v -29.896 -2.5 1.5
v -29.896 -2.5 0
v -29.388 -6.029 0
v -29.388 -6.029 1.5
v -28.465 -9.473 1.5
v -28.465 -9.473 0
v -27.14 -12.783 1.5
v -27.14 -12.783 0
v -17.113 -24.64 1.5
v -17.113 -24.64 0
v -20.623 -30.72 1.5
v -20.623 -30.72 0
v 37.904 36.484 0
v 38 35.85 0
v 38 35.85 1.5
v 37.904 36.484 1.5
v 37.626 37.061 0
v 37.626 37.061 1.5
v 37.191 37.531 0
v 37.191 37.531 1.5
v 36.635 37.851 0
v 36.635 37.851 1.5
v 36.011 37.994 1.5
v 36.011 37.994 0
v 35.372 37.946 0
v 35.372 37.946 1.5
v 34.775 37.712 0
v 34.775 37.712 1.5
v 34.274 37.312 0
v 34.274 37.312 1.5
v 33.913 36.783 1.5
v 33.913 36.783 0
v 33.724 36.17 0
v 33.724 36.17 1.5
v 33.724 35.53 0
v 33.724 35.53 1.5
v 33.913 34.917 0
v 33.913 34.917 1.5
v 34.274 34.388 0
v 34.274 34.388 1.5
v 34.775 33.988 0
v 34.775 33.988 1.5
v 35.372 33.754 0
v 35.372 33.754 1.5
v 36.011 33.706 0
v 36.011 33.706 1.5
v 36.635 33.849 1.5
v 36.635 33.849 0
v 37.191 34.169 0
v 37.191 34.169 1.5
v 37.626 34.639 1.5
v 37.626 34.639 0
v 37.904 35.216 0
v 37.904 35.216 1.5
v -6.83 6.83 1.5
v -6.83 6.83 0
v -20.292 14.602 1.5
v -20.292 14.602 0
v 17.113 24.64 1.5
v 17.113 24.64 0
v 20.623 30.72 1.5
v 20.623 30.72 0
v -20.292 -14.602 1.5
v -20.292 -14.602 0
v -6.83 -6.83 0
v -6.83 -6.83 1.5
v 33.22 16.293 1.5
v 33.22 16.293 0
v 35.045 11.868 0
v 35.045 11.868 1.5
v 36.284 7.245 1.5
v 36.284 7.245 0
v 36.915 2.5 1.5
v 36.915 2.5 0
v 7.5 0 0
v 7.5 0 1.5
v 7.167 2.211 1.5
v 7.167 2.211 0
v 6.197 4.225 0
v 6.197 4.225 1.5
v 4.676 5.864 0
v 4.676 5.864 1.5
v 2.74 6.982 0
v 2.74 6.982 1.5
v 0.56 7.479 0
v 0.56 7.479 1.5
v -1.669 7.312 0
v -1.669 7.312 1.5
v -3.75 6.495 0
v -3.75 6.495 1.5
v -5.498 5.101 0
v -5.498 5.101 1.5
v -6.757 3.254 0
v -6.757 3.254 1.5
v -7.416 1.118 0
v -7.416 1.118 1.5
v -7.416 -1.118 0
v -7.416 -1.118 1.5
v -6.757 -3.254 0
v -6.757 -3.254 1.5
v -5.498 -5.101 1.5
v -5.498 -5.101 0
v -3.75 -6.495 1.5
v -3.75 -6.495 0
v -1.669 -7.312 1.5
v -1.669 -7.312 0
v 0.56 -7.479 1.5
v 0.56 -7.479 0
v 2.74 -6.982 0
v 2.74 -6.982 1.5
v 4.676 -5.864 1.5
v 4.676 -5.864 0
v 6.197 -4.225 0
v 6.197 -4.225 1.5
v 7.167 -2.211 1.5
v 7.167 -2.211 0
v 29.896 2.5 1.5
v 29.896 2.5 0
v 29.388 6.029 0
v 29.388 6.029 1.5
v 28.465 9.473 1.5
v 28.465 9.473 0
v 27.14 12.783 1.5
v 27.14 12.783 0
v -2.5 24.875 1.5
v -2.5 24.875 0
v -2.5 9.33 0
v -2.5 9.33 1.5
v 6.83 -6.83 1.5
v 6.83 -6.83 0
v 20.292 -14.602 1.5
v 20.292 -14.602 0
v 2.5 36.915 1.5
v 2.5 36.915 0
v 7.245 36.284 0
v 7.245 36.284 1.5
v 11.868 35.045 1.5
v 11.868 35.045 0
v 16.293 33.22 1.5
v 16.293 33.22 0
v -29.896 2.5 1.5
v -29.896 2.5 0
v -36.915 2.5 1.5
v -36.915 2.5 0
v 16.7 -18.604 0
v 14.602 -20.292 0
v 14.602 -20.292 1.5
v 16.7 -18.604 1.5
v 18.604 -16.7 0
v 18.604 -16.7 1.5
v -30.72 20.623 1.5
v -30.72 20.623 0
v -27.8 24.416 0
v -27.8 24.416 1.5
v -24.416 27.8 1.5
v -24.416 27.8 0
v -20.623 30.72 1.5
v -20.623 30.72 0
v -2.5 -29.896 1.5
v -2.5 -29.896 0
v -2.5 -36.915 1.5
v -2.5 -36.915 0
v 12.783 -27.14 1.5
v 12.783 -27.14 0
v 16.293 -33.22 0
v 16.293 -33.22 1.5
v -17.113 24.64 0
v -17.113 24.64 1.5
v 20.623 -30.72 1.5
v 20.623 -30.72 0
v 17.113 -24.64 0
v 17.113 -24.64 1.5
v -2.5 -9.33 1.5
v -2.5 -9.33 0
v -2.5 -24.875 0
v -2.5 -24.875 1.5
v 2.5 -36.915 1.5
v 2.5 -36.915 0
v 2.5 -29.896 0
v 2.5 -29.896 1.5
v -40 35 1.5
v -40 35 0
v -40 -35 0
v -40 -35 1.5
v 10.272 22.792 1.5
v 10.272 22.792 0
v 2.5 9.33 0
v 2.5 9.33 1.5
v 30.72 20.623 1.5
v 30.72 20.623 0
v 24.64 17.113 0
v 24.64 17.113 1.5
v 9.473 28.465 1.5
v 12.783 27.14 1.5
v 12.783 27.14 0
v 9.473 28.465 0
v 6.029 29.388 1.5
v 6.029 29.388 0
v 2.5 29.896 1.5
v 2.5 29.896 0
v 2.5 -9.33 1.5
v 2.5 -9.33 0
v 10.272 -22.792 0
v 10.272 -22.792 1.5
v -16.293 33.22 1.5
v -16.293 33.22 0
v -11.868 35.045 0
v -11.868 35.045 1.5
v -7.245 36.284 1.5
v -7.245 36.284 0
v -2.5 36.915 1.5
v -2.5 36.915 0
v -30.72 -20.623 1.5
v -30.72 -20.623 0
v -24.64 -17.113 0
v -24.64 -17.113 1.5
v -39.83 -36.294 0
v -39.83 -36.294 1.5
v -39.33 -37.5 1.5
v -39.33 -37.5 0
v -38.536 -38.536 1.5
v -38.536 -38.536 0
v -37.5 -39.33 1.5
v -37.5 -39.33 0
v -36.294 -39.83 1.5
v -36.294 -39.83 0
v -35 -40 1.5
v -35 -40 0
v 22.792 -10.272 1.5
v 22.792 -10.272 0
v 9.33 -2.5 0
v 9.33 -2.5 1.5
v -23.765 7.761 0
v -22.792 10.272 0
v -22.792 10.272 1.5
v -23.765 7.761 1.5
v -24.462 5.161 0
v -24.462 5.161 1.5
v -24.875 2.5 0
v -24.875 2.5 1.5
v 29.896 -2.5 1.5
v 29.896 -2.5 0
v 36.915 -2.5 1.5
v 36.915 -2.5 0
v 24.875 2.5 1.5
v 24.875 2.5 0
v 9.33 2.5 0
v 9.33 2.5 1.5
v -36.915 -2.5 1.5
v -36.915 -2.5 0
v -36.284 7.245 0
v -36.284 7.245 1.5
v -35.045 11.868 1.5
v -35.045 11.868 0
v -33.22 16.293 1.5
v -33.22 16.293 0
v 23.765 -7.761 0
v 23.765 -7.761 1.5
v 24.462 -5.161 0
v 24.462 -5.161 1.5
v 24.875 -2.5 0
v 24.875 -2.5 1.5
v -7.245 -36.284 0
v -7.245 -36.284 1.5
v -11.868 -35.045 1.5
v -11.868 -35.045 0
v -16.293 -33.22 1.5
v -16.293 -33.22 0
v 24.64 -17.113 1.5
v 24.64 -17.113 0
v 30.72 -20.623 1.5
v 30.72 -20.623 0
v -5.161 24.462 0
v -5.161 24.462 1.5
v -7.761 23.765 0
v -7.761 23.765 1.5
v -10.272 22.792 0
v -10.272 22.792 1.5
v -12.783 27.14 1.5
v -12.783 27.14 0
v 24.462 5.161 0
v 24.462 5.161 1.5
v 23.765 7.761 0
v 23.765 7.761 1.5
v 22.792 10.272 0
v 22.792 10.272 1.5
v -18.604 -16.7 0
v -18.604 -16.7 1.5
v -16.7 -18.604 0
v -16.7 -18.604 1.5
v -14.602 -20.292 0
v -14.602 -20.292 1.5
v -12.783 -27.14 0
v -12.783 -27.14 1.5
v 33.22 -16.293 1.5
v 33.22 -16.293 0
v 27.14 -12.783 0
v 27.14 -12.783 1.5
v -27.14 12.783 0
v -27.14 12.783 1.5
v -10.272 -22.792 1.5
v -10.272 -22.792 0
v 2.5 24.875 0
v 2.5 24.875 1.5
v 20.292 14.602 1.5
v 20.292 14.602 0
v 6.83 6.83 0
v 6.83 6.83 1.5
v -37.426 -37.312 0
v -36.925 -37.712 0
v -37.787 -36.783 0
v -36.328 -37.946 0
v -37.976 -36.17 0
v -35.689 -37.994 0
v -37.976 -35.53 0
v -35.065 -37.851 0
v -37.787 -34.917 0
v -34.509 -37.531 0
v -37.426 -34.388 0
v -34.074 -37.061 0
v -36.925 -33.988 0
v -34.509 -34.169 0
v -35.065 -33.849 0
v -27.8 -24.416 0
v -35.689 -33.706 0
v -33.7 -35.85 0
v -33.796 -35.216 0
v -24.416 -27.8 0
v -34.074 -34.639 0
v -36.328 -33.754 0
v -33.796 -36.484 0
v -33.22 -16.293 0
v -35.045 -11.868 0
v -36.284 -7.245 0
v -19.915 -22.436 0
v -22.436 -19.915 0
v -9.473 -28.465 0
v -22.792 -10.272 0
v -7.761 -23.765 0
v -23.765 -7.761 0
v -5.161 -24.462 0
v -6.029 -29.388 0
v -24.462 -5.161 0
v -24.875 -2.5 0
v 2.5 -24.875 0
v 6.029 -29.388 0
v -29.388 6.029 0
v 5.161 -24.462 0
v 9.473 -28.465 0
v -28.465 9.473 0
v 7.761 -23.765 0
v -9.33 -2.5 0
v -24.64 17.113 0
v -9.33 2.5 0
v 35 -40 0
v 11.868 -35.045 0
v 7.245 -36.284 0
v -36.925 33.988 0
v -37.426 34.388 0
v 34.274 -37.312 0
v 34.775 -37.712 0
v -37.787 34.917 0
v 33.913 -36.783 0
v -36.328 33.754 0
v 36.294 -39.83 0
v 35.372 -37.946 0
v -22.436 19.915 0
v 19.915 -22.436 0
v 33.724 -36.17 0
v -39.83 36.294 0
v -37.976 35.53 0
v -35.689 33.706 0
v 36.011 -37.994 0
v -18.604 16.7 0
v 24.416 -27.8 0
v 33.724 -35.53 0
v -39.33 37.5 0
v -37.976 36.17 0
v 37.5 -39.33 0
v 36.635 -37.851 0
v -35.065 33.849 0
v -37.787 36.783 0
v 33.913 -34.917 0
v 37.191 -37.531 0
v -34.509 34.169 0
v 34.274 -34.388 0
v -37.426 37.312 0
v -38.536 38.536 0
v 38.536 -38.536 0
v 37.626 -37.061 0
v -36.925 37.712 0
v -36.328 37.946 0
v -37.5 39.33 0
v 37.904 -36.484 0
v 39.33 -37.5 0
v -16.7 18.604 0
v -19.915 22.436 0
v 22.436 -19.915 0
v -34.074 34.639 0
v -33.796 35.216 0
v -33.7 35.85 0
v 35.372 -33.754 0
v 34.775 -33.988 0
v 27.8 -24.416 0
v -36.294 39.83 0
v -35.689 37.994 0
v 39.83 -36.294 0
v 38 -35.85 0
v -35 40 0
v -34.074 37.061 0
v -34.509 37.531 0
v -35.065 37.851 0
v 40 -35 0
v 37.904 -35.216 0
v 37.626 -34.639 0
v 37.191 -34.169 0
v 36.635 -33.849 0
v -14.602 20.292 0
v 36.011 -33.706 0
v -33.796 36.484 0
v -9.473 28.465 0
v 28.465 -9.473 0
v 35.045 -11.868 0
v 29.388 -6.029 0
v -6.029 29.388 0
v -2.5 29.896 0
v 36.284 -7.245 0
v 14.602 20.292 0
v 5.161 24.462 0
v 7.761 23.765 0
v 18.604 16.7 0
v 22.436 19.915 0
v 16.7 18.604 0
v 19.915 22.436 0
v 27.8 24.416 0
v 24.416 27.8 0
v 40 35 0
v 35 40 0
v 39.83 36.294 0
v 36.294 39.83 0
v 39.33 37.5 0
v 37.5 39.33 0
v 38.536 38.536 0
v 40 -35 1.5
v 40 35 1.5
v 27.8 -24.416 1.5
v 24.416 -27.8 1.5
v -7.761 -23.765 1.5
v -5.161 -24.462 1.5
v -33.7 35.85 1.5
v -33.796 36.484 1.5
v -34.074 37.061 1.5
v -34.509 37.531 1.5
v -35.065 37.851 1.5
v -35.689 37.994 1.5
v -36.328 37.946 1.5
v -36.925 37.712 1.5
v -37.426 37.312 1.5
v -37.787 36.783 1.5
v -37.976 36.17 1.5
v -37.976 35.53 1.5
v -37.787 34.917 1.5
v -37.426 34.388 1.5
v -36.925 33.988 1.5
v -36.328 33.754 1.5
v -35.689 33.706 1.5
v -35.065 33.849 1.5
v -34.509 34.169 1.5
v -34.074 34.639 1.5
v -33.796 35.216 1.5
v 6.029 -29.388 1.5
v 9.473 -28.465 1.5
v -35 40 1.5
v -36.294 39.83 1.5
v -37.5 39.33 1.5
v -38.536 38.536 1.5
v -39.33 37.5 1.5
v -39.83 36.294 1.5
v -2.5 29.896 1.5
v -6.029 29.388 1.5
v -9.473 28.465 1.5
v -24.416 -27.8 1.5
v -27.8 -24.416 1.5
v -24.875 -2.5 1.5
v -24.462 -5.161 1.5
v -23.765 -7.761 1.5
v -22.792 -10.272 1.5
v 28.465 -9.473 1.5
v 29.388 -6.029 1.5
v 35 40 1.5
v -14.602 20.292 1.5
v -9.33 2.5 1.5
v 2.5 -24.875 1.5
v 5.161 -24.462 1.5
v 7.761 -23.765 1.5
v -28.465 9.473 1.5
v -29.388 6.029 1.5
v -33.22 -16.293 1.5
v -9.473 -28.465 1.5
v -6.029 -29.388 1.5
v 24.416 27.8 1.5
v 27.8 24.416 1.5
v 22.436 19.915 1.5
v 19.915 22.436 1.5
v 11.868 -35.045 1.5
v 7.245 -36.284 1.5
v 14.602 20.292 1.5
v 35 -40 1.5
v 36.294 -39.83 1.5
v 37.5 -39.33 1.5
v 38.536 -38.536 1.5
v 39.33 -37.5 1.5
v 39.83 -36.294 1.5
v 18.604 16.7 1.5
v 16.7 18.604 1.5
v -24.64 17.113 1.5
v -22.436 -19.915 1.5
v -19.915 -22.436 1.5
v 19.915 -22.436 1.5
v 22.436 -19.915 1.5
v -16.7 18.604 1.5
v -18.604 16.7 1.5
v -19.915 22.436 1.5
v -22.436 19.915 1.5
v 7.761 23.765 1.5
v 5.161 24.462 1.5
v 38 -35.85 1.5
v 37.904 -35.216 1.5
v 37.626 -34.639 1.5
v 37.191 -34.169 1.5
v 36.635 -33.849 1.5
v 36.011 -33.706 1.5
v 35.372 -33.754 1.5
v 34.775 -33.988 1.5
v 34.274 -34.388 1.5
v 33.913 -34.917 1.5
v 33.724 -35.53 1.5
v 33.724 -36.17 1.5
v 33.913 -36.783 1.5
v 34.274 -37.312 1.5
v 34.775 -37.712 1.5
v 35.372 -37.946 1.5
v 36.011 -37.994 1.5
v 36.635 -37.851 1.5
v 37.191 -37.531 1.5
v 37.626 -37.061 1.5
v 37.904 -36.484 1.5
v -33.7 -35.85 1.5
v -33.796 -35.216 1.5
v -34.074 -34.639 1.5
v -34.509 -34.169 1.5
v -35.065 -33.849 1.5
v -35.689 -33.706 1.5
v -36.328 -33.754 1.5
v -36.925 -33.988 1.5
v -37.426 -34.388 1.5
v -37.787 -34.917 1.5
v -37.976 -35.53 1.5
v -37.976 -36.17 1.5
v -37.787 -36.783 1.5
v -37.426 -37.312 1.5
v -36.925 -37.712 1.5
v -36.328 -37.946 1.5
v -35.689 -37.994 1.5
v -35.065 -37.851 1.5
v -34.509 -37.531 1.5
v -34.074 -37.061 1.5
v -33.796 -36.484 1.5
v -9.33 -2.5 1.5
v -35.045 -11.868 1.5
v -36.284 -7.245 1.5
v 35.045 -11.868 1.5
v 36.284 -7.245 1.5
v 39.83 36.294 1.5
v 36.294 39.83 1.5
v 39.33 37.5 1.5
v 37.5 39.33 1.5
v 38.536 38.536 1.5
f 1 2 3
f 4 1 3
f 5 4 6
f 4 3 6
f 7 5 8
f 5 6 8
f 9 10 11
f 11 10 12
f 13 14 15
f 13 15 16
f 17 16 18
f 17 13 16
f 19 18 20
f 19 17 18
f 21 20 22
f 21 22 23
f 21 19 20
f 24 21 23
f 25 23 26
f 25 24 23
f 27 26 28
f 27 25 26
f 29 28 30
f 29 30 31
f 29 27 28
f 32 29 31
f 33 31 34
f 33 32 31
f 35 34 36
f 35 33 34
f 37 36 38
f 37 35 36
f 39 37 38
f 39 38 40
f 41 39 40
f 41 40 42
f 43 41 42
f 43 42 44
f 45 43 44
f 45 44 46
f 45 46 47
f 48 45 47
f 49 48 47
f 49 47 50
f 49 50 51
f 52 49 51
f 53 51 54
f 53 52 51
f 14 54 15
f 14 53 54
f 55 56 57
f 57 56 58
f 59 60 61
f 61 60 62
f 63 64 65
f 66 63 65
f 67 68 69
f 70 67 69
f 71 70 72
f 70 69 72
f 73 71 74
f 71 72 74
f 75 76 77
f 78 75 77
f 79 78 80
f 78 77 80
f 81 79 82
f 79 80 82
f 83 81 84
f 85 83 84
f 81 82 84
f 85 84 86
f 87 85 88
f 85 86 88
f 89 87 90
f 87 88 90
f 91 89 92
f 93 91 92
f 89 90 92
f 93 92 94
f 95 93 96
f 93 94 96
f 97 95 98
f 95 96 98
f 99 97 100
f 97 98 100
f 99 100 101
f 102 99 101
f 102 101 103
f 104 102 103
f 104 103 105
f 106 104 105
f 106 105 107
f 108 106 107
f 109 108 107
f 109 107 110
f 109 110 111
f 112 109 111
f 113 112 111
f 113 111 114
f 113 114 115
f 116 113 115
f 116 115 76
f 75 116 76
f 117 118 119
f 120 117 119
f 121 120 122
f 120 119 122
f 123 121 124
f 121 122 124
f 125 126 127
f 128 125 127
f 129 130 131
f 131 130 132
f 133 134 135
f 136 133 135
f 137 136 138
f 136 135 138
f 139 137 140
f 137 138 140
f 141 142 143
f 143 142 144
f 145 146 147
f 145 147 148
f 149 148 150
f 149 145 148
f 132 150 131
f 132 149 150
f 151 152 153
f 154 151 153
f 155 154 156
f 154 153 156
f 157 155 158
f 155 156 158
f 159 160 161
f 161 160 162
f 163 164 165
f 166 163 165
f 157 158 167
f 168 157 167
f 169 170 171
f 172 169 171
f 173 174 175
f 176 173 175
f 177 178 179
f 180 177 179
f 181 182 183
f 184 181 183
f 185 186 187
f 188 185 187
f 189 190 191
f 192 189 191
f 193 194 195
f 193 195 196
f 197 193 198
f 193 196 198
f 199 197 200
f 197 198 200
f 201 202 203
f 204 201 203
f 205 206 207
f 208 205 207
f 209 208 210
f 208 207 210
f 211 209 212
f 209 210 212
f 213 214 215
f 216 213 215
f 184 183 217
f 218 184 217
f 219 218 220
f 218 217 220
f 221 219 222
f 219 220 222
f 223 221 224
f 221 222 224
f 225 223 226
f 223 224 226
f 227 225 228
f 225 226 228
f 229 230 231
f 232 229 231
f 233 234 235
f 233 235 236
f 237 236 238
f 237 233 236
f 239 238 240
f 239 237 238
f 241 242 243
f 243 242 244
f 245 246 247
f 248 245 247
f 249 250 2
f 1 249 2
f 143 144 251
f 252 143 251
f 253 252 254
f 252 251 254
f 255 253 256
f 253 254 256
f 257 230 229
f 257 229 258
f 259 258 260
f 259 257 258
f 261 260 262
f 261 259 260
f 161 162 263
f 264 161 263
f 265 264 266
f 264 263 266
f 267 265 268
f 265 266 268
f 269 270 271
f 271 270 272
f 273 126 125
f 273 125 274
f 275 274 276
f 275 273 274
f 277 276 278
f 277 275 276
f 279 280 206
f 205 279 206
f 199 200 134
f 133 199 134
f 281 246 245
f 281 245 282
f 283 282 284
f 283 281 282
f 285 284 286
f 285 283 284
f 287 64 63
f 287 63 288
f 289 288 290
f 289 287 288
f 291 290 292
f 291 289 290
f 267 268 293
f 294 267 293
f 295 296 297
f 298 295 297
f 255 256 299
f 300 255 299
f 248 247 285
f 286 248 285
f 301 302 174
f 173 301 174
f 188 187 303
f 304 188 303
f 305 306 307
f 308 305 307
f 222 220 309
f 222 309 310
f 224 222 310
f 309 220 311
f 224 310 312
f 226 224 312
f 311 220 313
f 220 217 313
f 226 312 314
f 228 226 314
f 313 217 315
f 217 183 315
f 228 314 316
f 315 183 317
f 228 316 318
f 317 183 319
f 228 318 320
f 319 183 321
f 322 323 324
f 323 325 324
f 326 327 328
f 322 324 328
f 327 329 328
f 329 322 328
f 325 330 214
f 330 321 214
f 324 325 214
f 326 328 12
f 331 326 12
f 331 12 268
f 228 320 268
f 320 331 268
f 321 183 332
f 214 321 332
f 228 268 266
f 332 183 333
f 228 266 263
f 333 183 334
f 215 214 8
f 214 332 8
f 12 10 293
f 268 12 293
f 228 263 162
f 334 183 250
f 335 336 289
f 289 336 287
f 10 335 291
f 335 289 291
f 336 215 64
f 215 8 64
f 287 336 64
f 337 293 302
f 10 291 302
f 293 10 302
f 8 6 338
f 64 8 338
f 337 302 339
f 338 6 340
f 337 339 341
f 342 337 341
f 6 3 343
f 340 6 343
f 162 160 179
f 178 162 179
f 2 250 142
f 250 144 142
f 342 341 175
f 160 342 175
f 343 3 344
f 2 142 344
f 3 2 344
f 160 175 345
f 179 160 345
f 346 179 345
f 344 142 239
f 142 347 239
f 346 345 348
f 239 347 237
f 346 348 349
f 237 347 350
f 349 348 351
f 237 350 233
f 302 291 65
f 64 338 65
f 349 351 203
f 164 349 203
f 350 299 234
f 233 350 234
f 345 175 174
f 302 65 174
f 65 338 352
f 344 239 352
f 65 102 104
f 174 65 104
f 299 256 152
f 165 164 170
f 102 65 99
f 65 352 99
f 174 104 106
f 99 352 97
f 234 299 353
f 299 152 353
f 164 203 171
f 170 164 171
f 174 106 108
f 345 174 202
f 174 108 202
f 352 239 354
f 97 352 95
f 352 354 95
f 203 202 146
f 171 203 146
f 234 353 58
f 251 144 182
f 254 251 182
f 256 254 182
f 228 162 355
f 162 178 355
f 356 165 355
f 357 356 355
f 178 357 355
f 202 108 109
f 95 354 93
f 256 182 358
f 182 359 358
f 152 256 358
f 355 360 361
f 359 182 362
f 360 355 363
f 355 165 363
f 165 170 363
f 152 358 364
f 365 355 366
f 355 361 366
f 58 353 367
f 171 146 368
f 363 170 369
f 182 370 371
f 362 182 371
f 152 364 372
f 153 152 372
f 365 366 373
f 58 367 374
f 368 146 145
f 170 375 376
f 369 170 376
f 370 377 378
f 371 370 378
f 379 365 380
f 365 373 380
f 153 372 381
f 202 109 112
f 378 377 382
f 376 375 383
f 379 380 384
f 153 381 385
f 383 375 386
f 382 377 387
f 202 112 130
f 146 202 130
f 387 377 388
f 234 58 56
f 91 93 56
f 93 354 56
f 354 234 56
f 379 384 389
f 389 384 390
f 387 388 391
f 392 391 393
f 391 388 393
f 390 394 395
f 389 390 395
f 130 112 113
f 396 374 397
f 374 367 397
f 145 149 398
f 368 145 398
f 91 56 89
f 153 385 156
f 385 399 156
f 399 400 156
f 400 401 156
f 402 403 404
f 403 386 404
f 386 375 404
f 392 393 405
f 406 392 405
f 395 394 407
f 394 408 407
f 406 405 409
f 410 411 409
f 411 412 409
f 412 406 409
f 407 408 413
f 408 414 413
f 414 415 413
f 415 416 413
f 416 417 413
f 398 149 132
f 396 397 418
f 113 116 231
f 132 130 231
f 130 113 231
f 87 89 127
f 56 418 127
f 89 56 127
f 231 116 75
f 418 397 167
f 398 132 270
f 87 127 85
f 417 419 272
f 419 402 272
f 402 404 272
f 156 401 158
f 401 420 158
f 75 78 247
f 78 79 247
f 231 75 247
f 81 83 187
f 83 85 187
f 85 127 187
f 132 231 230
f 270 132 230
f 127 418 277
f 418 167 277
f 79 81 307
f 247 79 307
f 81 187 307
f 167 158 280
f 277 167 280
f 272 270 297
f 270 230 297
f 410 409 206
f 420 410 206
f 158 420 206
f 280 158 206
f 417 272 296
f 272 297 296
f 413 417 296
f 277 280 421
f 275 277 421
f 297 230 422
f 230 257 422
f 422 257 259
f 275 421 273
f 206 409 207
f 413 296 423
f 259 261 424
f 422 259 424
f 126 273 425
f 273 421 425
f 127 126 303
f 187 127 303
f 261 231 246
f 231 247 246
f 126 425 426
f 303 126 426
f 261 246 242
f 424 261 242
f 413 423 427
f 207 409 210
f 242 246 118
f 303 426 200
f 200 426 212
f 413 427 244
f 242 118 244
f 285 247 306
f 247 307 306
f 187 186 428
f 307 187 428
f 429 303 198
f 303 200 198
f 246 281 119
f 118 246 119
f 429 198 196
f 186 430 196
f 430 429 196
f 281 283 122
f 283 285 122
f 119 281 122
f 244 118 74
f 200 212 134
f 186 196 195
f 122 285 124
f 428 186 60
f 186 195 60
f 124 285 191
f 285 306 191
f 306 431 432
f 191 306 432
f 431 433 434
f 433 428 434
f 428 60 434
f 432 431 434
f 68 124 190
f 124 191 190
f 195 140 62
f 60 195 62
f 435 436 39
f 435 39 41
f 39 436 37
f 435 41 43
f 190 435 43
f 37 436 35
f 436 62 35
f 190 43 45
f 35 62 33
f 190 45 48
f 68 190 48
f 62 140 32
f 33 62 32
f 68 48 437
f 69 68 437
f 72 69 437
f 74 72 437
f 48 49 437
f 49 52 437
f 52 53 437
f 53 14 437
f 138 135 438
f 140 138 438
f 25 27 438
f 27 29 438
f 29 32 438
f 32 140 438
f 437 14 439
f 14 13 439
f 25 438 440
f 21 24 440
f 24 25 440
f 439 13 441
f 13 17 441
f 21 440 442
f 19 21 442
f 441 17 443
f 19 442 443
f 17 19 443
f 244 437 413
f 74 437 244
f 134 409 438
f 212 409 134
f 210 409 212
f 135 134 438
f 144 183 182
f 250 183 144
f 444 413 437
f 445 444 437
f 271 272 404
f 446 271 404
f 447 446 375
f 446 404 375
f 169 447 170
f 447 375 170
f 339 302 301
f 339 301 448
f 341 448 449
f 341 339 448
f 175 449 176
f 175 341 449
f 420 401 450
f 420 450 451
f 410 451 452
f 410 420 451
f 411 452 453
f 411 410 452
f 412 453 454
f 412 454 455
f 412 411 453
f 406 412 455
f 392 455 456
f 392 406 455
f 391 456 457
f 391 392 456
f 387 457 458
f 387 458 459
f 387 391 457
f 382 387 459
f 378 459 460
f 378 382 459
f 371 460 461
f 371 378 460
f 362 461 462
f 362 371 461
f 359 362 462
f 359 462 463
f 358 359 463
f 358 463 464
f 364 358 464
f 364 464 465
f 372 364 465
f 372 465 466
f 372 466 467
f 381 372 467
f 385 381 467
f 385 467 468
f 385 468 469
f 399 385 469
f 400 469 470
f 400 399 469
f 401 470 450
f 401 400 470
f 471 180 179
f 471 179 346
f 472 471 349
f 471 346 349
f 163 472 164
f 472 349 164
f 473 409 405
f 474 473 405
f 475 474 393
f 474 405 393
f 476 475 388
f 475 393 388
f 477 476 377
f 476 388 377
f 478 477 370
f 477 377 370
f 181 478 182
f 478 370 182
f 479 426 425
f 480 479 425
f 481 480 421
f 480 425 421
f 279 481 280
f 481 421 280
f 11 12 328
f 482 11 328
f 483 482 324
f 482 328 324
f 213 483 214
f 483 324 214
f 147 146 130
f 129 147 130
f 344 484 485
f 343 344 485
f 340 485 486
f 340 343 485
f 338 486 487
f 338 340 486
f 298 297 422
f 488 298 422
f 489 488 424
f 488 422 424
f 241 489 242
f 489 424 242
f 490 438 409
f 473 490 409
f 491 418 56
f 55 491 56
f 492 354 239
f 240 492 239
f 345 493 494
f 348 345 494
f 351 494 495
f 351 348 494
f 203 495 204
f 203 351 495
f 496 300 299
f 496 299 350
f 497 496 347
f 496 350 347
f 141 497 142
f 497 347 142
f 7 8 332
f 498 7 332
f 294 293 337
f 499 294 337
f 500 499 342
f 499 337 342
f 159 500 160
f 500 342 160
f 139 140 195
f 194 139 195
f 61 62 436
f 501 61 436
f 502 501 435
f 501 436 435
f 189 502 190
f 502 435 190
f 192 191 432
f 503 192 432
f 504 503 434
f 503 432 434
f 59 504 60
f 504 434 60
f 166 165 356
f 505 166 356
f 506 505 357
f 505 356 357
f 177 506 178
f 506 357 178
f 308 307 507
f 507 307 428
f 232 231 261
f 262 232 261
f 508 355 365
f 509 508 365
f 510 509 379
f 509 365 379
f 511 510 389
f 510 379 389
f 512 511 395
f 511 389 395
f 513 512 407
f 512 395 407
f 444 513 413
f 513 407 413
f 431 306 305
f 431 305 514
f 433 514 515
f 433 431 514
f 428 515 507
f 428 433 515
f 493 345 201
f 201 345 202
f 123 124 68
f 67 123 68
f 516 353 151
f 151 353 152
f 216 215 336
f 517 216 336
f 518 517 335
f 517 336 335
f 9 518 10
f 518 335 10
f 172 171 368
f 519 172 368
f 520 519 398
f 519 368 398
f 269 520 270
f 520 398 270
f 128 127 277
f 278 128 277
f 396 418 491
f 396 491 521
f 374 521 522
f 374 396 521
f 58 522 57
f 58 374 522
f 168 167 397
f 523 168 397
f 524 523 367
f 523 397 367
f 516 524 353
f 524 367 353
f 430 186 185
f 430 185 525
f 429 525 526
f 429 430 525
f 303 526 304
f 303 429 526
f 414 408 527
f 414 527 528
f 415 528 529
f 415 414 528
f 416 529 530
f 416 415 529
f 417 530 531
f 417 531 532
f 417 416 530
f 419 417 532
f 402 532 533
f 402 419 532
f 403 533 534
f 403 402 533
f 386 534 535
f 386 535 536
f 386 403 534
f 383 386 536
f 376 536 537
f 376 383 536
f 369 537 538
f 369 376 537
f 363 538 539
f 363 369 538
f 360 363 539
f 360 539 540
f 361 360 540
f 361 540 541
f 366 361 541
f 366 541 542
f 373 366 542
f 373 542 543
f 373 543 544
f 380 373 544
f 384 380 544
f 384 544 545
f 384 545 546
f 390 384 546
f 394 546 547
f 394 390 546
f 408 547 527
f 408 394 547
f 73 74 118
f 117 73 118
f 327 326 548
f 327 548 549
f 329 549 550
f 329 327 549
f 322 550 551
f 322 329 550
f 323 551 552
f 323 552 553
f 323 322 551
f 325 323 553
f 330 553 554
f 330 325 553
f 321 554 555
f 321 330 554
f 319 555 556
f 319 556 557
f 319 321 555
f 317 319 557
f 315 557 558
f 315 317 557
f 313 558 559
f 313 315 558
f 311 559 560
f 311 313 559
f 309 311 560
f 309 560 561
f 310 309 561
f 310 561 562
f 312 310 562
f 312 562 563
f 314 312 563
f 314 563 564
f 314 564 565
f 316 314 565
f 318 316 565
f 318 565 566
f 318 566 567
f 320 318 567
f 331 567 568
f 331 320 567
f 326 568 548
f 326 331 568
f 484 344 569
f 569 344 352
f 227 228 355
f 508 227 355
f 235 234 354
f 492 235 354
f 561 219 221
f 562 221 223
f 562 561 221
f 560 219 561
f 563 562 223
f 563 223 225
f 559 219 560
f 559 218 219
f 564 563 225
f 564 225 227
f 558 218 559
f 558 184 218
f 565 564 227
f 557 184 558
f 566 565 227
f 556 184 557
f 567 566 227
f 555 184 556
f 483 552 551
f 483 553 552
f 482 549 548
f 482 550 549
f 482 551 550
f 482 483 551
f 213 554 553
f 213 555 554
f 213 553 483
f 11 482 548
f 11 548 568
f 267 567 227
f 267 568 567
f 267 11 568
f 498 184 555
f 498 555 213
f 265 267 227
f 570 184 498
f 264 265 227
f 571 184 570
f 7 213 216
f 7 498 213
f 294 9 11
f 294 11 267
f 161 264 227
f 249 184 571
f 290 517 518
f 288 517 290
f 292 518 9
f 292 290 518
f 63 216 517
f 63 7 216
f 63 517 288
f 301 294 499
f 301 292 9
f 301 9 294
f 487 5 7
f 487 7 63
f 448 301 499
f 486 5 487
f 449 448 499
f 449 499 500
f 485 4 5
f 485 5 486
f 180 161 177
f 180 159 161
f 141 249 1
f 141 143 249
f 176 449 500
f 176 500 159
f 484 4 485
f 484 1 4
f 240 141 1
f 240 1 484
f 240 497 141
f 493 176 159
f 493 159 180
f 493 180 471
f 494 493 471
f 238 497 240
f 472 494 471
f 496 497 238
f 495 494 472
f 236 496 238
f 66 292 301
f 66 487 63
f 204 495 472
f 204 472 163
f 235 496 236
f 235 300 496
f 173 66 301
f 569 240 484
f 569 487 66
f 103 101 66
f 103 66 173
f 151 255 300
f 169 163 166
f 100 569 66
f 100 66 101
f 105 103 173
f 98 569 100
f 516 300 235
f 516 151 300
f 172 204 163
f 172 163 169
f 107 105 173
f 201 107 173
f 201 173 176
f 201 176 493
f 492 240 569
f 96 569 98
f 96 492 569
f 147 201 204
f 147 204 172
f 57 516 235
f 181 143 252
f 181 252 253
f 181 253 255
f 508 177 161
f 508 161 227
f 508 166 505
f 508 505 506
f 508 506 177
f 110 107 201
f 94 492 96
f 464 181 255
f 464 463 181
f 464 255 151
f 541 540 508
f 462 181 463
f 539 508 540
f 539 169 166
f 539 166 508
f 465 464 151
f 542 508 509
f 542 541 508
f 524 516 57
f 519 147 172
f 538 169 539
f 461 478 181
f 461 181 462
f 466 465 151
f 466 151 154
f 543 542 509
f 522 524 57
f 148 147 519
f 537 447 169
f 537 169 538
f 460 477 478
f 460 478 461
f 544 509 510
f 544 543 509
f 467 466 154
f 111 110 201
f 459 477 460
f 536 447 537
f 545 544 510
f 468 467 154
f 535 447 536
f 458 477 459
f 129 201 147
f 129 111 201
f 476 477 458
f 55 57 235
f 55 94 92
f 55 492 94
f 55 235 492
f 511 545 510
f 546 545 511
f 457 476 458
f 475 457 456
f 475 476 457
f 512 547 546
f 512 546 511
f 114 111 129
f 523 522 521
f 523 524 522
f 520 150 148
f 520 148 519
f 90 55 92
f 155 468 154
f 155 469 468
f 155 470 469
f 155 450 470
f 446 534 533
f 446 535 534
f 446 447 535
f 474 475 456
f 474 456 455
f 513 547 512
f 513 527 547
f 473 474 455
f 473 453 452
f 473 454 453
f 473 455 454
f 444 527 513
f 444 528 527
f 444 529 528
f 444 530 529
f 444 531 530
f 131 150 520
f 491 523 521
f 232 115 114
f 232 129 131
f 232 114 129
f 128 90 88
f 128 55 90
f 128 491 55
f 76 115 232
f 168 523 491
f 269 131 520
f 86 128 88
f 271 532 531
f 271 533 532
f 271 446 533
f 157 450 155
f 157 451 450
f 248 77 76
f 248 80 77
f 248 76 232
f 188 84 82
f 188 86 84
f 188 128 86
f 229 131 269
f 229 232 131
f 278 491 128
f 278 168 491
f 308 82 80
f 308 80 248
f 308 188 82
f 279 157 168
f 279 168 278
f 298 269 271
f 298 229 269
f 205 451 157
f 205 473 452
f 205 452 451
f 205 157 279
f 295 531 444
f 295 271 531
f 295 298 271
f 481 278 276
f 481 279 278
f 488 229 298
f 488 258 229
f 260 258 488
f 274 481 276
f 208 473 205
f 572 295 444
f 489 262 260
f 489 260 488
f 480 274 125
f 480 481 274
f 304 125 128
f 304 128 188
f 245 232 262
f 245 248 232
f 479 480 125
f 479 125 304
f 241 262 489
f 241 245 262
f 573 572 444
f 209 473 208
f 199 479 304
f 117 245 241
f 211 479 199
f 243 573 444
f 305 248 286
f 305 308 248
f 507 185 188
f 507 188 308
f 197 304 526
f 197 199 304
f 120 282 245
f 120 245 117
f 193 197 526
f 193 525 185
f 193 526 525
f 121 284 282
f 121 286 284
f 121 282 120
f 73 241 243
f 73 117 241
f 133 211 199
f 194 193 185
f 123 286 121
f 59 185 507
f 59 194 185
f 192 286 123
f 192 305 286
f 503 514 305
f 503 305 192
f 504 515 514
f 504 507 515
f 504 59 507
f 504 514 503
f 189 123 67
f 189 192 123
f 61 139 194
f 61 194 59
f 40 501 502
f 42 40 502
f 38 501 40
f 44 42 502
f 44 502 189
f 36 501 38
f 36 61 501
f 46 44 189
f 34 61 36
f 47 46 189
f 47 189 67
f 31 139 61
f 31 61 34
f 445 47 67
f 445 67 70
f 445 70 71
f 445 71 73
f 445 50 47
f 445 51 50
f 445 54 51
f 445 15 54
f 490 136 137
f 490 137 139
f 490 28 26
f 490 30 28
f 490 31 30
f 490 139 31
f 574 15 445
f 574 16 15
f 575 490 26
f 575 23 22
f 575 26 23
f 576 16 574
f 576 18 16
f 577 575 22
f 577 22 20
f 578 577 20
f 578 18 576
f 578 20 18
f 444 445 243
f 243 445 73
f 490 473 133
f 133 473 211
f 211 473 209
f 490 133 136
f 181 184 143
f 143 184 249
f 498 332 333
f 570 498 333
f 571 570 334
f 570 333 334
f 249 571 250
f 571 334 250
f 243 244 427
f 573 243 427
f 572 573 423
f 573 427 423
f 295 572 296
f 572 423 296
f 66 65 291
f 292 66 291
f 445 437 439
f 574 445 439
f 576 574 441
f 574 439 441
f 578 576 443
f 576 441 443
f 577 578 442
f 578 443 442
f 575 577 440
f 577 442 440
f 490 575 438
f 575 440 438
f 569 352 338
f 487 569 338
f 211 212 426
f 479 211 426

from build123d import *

# Parameters (mm, degrees)
F0_R     = 2.15
F2_DEPTH = 1.5
F1_R     = 30
F1_R_2   = 25
F3_DEPTH = 1.5
F4_R     = 7.5
F5_DEPTH = 25


with BuildPart() as f2:
    # F0 (on Top) → F2 (new body)
    with BuildSketch(Plane.XY):
        with BuildLine():
            ThreePointArc((40, 0), (28.2842712475, 28.2842712475), (0, 40))
            ThreePointArc((0, 40), (-28.2842712475, 28.2842712475), (-40, 0))
            ThreePointArc((-40, 0), (-28.2842712475, -28.2842712475), (0, -40))
            ThreePointArc((0, -40), (28.2842712475, -28.2842712475), (40, 0))
        make_face()
        with BuildLine():
            ThreePointArc((36.9154439226, 2.5), (36.9788549386, 1.2507147687), (37, 0))
            ThreePointArc((37, 0), (36.9788549386, -1.2507147687), (36.9154439226, -2.5))
            ThreePointArc((36.9154439226, -2.5), (35.7392555727, -9.5763046688), (33.2197122289, -16.2926584518))
            ThreePointArc((33.2197122289, -16.2926584518), (32.04293994, -18.5), (30.7197122289, -20.6227854707))
            ThreePointArc((30.7197122289, -20.6227854707), (26.1629509039, -26.1629509039), (20.6227854707, -30.7197122289))
            ThreePointArc((20.6227854707, -30.7197122289), (18.5, -32.04293994), (16.2926584518, -33.2197122289))
            ThreePointArc((16.2926584518, -33.2197122289), (9.5763046688, -35.7392555727), (2.5, -36.9154439226))
            ThreePointArc((2.5, -36.9154439226), (0, -37), (-2.5, -36.9154439226))
            ThreePointArc((-2.5, -36.9154439226), (-9.5763046688, -35.7392555727), (-16.2926584518, -33.2197122289))
            ThreePointArc((-16.2926584518, -33.2197122289), (-18.5, -32.04293994), (-20.6227854707, -30.7197122289))
            ThreePointArc((-20.6227854707, -30.7197122289), (-26.1629509039, -26.1629509039), (-30.7197122289, -20.6227854707))
            ThreePointArc((-30.7197122289, -20.6227854707), (-32.04293994, -18.5), (-33.2197122289, -16.2926584518))
            ThreePointArc((-33.2197122289, -16.2926584518), (-35.7392555727, -9.5763046688), (-36.9154439226, -2.5))
            ThreePointArc((-36.9154439226, -2.5), (-37, 0), (-36.9154439226, 2.5))
            ThreePointArc((-36.9154439226, 2.5), (-35.7392555727, 9.5763046688), (-33.2197122289, 16.2926584518))
            ThreePointArc((-33.2197122289, 16.2926584518), (-32.04293994, 18.5), (-30.7197122289, 20.6227854707))
            ThreePointArc((-30.7197122289, 20.6227854707), (-26.1629509039, 26.1629509039), (-20.6227854707, 30.7197122289))
            ThreePointArc((-20.6227854707, 30.7197122289), (-18.5, 32.04293994), (-16.2926584518, 33.2197122289))
            ThreePointArc((-16.2926584518, 33.2197122289), (-9.5763046688, 35.7392555727), (-2.5, 36.9154439226))
            ThreePointArc((-2.5, 36.9154439226), (0, 37), (2.5, 36.9154439226))
            ThreePointArc((2.5, 36.9154439226), (9.5763046688, 35.7392555727), (16.2926584518, 33.2197122289))
            ThreePointArc((16.2926584518, 33.2197122289), (18.5, 32.04293994), (20.6227854707, 30.7197122289))
            ThreePointArc((20.6227854707, 30.7197122289), (26.1629509039, 26.1629509039), (30.7197122289, 20.6227854707))
            ThreePointArc((30.7197122289, 20.6227854707), (32.04293994, 18.5), (33.2197122289, 16.2926584518))
            ThreePointArc((33.2197122289, 16.2926584518), (35.7392555727, 9.5763046688), (36.9154439226, 2.5))
        make_face(mode=Mode.SUBTRACT)
        with BuildLine():
            ThreePointArc((36.9154439226, -2.5), (36.9788549386, -1.2507147687), (37, 0))
            ThreePointArc((37, 0), (36.9788549386, 1.2507147687), (36.9154439226, 2.5))
            Line((36.9154439226, 2.5), (9.3301270189, 2.5))
            Line((9.3301270189, 2.5), (33.2197122289, 16.2926584518))
            ThreePointArc((33.2197122289, 16.2926584518), (32.04293994, 18.5), (30.7197122289, 20.6227854707))
            Line((30.7197122289, 20.6227854707), (6.8301270189, 6.8301270189))
            Line((6.8301270189, 6.8301270189), (20.6227854707, 30.7197122289))
            ThreePointArc((20.6227854707, 30.7197122289), (18.5, 32.04293994), (16.2926584518, 33.2197122289))
            Line((16.2926584518, 33.2197122289), (2.5, 9.3301270189))
            Line((2.5, 9.3301270189), (2.5, 36.9154439226))
            ThreePointArc((2.5, 36.9154439226), (0, 37), (-2.5, 36.9154439226))
            Line((-2.5, 36.9154439226), (-2.5, 9.3301270189))
            Line((-2.5, 9.3301270189), (-16.2926584518, 33.2197122289))
            ThreePointArc((-16.2926584518, 33.2197122289), (-18.5, 32.04293994), (-20.6227854707, 30.7197122289))
            Line((-20.6227854707, 30.7197122289), (-6.8301270189, 6.8301270189))
            Line((-6.8301270189, 6.8301270189), (-30.7197122289, 20.6227854707))
            ThreePointArc((-30.7197122289, 20.6227854707), (-32.04293994, 18.5), (-33.2197122289, 16.2926584518))
            Line((-33.2197122289, 16.2926584518), (-9.3301270183, 2.5))
            Line((-9.3301270183, 2.5), (-36.9154439226, 2.5))
            ThreePointArc((-36.9154439226, 2.5), (-37, 0), (-36.9154439226, -2.5))
            Line((-36.9154439226, -2.5), (-9.3301270189, -2.5))
            Line((-9.3301270189, -2.5), (-33.2197122289, -16.2926584518))
            ThreePointArc((-33.2197122289, -16.2926584518), (-32.04293994, -18.5), (-30.7197122289, -20.6227854707))
            Line((-30.7197122289, -20.6227854707), (-6.8301270191, -6.830127019))
            Line((-6.8301270191, -6.830127019), (-20.6227854707, -30.7197122289))
            ThreePointArc((-20.6227854707, -30.7197122289), (-18.5, -32.04293994), (-16.2926584518, -33.2197122289))
            Line((-16.2926584518, -33.2197122289), (-2.5, -9.3301270189))
            Line((-2.5, -9.3301270189), (-2.5, -36.9154439226))
            ThreePointArc((-2.5, -36.9154439226), (0, -37), (2.5, -36.9154439226))
            Line((2.5, -36.9154439226), (2.5, -9.3301270189))
            Line((2.5, -9.3301270189), (16.2926584518, -33.2197122289))
            ThreePointArc((16.2926584518, -33.2197122289), (18.5, -32.04293994), (20.6227854707, -30.7197122289))
            Line((20.6227854707, -30.7197122289), (6.8301270189, -6.8301270189))
            Line((6.8301270189, -6.8301270189), (30.7197122289, -20.6227854707))
            ThreePointArc((30.7197122289, -20.6227854707), (32.04293994, -18.5), (33.2197122289, -16.2926584518))
            Line((33.2197122289, -16.2926584518), (9.3301270189, -2.5))
            Line((9.3301270189, -2.5), (36.9154439226, -2.5))
        make_face()
        with BuildLine():
            Line((0, 40), (-35, 40))
            ThreePointArc((-35, 40), (-38.5355339059, 38.5355339059), (-40, 35))
            Line((-40, 35), (-40, 0))
            ThreePointArc((-40, 0), (-28.2842712475, 28.2842712475), (0, 40))
        make_face()
        with Locations((-35.85, 35.85)):
            Circle(F0_R, mode=Mode.SUBTRACT)
        with BuildLine():
            ThreePointArc((0, -40), (-28.2842712475, -28.2842712475), (-40, 0))
            Line((-40, 0), (-40, -35))
            ThreePointArc((-40, -35), (-38.5355339059, -38.5355339059), (-35, -40))
            Line((-35, -40), (0, -40))
        make_face()
        with Locations((-35.85, -35.85)):
            Circle(F0_R, mode=Mode.SUBTRACT)
        with BuildLine():
            Line((35, 40), (0, 40))
            ThreePointArc((0, 40), (28.2842712475, 28.2842712475), (40, 0))
            Line((40, 0), (40, 35))
            ThreePointArc((40, 35), (38.5355339059, 38.5355339059), (35, 40))
        make_face()
        with Locations((35.85, 35.85)):
            Circle(F0_R, mode=Mode.SUBTRACT)
        with BuildLine():
            Line((40, -35), (40, 0))
            ThreePointArc((40, 0), (28.2842712475, -28.2842712475), (0, -40))
            Line((0, -40), (35, -40))
            ThreePointArc((35, -40), (38.5355339059, -38.5355339059), (40, -35))
        make_face()
        with Locations((35.85, -35.85)):
            Circle(F0_R, mode=Mode.SUBTRACT)
    extrude(amount=F2_DEPTH)

    # F1 (on Top) → F3 (join)
    with BuildSketch(Plane.XY):
        Circle(F1_R)
        Circle(F1_R_2, mode=Mode.SUBTRACT)
    extrude(amount=F3_DEPTH)

    # F4 (on face) → F5 (cut)
    with BuildSketch(Plane.XY.offset(1.5)):
        Circle(F4_R)
    extrude(amount=-F5_DEPTH, mode=Mode.SUBTRACT)


solid = f2.part
